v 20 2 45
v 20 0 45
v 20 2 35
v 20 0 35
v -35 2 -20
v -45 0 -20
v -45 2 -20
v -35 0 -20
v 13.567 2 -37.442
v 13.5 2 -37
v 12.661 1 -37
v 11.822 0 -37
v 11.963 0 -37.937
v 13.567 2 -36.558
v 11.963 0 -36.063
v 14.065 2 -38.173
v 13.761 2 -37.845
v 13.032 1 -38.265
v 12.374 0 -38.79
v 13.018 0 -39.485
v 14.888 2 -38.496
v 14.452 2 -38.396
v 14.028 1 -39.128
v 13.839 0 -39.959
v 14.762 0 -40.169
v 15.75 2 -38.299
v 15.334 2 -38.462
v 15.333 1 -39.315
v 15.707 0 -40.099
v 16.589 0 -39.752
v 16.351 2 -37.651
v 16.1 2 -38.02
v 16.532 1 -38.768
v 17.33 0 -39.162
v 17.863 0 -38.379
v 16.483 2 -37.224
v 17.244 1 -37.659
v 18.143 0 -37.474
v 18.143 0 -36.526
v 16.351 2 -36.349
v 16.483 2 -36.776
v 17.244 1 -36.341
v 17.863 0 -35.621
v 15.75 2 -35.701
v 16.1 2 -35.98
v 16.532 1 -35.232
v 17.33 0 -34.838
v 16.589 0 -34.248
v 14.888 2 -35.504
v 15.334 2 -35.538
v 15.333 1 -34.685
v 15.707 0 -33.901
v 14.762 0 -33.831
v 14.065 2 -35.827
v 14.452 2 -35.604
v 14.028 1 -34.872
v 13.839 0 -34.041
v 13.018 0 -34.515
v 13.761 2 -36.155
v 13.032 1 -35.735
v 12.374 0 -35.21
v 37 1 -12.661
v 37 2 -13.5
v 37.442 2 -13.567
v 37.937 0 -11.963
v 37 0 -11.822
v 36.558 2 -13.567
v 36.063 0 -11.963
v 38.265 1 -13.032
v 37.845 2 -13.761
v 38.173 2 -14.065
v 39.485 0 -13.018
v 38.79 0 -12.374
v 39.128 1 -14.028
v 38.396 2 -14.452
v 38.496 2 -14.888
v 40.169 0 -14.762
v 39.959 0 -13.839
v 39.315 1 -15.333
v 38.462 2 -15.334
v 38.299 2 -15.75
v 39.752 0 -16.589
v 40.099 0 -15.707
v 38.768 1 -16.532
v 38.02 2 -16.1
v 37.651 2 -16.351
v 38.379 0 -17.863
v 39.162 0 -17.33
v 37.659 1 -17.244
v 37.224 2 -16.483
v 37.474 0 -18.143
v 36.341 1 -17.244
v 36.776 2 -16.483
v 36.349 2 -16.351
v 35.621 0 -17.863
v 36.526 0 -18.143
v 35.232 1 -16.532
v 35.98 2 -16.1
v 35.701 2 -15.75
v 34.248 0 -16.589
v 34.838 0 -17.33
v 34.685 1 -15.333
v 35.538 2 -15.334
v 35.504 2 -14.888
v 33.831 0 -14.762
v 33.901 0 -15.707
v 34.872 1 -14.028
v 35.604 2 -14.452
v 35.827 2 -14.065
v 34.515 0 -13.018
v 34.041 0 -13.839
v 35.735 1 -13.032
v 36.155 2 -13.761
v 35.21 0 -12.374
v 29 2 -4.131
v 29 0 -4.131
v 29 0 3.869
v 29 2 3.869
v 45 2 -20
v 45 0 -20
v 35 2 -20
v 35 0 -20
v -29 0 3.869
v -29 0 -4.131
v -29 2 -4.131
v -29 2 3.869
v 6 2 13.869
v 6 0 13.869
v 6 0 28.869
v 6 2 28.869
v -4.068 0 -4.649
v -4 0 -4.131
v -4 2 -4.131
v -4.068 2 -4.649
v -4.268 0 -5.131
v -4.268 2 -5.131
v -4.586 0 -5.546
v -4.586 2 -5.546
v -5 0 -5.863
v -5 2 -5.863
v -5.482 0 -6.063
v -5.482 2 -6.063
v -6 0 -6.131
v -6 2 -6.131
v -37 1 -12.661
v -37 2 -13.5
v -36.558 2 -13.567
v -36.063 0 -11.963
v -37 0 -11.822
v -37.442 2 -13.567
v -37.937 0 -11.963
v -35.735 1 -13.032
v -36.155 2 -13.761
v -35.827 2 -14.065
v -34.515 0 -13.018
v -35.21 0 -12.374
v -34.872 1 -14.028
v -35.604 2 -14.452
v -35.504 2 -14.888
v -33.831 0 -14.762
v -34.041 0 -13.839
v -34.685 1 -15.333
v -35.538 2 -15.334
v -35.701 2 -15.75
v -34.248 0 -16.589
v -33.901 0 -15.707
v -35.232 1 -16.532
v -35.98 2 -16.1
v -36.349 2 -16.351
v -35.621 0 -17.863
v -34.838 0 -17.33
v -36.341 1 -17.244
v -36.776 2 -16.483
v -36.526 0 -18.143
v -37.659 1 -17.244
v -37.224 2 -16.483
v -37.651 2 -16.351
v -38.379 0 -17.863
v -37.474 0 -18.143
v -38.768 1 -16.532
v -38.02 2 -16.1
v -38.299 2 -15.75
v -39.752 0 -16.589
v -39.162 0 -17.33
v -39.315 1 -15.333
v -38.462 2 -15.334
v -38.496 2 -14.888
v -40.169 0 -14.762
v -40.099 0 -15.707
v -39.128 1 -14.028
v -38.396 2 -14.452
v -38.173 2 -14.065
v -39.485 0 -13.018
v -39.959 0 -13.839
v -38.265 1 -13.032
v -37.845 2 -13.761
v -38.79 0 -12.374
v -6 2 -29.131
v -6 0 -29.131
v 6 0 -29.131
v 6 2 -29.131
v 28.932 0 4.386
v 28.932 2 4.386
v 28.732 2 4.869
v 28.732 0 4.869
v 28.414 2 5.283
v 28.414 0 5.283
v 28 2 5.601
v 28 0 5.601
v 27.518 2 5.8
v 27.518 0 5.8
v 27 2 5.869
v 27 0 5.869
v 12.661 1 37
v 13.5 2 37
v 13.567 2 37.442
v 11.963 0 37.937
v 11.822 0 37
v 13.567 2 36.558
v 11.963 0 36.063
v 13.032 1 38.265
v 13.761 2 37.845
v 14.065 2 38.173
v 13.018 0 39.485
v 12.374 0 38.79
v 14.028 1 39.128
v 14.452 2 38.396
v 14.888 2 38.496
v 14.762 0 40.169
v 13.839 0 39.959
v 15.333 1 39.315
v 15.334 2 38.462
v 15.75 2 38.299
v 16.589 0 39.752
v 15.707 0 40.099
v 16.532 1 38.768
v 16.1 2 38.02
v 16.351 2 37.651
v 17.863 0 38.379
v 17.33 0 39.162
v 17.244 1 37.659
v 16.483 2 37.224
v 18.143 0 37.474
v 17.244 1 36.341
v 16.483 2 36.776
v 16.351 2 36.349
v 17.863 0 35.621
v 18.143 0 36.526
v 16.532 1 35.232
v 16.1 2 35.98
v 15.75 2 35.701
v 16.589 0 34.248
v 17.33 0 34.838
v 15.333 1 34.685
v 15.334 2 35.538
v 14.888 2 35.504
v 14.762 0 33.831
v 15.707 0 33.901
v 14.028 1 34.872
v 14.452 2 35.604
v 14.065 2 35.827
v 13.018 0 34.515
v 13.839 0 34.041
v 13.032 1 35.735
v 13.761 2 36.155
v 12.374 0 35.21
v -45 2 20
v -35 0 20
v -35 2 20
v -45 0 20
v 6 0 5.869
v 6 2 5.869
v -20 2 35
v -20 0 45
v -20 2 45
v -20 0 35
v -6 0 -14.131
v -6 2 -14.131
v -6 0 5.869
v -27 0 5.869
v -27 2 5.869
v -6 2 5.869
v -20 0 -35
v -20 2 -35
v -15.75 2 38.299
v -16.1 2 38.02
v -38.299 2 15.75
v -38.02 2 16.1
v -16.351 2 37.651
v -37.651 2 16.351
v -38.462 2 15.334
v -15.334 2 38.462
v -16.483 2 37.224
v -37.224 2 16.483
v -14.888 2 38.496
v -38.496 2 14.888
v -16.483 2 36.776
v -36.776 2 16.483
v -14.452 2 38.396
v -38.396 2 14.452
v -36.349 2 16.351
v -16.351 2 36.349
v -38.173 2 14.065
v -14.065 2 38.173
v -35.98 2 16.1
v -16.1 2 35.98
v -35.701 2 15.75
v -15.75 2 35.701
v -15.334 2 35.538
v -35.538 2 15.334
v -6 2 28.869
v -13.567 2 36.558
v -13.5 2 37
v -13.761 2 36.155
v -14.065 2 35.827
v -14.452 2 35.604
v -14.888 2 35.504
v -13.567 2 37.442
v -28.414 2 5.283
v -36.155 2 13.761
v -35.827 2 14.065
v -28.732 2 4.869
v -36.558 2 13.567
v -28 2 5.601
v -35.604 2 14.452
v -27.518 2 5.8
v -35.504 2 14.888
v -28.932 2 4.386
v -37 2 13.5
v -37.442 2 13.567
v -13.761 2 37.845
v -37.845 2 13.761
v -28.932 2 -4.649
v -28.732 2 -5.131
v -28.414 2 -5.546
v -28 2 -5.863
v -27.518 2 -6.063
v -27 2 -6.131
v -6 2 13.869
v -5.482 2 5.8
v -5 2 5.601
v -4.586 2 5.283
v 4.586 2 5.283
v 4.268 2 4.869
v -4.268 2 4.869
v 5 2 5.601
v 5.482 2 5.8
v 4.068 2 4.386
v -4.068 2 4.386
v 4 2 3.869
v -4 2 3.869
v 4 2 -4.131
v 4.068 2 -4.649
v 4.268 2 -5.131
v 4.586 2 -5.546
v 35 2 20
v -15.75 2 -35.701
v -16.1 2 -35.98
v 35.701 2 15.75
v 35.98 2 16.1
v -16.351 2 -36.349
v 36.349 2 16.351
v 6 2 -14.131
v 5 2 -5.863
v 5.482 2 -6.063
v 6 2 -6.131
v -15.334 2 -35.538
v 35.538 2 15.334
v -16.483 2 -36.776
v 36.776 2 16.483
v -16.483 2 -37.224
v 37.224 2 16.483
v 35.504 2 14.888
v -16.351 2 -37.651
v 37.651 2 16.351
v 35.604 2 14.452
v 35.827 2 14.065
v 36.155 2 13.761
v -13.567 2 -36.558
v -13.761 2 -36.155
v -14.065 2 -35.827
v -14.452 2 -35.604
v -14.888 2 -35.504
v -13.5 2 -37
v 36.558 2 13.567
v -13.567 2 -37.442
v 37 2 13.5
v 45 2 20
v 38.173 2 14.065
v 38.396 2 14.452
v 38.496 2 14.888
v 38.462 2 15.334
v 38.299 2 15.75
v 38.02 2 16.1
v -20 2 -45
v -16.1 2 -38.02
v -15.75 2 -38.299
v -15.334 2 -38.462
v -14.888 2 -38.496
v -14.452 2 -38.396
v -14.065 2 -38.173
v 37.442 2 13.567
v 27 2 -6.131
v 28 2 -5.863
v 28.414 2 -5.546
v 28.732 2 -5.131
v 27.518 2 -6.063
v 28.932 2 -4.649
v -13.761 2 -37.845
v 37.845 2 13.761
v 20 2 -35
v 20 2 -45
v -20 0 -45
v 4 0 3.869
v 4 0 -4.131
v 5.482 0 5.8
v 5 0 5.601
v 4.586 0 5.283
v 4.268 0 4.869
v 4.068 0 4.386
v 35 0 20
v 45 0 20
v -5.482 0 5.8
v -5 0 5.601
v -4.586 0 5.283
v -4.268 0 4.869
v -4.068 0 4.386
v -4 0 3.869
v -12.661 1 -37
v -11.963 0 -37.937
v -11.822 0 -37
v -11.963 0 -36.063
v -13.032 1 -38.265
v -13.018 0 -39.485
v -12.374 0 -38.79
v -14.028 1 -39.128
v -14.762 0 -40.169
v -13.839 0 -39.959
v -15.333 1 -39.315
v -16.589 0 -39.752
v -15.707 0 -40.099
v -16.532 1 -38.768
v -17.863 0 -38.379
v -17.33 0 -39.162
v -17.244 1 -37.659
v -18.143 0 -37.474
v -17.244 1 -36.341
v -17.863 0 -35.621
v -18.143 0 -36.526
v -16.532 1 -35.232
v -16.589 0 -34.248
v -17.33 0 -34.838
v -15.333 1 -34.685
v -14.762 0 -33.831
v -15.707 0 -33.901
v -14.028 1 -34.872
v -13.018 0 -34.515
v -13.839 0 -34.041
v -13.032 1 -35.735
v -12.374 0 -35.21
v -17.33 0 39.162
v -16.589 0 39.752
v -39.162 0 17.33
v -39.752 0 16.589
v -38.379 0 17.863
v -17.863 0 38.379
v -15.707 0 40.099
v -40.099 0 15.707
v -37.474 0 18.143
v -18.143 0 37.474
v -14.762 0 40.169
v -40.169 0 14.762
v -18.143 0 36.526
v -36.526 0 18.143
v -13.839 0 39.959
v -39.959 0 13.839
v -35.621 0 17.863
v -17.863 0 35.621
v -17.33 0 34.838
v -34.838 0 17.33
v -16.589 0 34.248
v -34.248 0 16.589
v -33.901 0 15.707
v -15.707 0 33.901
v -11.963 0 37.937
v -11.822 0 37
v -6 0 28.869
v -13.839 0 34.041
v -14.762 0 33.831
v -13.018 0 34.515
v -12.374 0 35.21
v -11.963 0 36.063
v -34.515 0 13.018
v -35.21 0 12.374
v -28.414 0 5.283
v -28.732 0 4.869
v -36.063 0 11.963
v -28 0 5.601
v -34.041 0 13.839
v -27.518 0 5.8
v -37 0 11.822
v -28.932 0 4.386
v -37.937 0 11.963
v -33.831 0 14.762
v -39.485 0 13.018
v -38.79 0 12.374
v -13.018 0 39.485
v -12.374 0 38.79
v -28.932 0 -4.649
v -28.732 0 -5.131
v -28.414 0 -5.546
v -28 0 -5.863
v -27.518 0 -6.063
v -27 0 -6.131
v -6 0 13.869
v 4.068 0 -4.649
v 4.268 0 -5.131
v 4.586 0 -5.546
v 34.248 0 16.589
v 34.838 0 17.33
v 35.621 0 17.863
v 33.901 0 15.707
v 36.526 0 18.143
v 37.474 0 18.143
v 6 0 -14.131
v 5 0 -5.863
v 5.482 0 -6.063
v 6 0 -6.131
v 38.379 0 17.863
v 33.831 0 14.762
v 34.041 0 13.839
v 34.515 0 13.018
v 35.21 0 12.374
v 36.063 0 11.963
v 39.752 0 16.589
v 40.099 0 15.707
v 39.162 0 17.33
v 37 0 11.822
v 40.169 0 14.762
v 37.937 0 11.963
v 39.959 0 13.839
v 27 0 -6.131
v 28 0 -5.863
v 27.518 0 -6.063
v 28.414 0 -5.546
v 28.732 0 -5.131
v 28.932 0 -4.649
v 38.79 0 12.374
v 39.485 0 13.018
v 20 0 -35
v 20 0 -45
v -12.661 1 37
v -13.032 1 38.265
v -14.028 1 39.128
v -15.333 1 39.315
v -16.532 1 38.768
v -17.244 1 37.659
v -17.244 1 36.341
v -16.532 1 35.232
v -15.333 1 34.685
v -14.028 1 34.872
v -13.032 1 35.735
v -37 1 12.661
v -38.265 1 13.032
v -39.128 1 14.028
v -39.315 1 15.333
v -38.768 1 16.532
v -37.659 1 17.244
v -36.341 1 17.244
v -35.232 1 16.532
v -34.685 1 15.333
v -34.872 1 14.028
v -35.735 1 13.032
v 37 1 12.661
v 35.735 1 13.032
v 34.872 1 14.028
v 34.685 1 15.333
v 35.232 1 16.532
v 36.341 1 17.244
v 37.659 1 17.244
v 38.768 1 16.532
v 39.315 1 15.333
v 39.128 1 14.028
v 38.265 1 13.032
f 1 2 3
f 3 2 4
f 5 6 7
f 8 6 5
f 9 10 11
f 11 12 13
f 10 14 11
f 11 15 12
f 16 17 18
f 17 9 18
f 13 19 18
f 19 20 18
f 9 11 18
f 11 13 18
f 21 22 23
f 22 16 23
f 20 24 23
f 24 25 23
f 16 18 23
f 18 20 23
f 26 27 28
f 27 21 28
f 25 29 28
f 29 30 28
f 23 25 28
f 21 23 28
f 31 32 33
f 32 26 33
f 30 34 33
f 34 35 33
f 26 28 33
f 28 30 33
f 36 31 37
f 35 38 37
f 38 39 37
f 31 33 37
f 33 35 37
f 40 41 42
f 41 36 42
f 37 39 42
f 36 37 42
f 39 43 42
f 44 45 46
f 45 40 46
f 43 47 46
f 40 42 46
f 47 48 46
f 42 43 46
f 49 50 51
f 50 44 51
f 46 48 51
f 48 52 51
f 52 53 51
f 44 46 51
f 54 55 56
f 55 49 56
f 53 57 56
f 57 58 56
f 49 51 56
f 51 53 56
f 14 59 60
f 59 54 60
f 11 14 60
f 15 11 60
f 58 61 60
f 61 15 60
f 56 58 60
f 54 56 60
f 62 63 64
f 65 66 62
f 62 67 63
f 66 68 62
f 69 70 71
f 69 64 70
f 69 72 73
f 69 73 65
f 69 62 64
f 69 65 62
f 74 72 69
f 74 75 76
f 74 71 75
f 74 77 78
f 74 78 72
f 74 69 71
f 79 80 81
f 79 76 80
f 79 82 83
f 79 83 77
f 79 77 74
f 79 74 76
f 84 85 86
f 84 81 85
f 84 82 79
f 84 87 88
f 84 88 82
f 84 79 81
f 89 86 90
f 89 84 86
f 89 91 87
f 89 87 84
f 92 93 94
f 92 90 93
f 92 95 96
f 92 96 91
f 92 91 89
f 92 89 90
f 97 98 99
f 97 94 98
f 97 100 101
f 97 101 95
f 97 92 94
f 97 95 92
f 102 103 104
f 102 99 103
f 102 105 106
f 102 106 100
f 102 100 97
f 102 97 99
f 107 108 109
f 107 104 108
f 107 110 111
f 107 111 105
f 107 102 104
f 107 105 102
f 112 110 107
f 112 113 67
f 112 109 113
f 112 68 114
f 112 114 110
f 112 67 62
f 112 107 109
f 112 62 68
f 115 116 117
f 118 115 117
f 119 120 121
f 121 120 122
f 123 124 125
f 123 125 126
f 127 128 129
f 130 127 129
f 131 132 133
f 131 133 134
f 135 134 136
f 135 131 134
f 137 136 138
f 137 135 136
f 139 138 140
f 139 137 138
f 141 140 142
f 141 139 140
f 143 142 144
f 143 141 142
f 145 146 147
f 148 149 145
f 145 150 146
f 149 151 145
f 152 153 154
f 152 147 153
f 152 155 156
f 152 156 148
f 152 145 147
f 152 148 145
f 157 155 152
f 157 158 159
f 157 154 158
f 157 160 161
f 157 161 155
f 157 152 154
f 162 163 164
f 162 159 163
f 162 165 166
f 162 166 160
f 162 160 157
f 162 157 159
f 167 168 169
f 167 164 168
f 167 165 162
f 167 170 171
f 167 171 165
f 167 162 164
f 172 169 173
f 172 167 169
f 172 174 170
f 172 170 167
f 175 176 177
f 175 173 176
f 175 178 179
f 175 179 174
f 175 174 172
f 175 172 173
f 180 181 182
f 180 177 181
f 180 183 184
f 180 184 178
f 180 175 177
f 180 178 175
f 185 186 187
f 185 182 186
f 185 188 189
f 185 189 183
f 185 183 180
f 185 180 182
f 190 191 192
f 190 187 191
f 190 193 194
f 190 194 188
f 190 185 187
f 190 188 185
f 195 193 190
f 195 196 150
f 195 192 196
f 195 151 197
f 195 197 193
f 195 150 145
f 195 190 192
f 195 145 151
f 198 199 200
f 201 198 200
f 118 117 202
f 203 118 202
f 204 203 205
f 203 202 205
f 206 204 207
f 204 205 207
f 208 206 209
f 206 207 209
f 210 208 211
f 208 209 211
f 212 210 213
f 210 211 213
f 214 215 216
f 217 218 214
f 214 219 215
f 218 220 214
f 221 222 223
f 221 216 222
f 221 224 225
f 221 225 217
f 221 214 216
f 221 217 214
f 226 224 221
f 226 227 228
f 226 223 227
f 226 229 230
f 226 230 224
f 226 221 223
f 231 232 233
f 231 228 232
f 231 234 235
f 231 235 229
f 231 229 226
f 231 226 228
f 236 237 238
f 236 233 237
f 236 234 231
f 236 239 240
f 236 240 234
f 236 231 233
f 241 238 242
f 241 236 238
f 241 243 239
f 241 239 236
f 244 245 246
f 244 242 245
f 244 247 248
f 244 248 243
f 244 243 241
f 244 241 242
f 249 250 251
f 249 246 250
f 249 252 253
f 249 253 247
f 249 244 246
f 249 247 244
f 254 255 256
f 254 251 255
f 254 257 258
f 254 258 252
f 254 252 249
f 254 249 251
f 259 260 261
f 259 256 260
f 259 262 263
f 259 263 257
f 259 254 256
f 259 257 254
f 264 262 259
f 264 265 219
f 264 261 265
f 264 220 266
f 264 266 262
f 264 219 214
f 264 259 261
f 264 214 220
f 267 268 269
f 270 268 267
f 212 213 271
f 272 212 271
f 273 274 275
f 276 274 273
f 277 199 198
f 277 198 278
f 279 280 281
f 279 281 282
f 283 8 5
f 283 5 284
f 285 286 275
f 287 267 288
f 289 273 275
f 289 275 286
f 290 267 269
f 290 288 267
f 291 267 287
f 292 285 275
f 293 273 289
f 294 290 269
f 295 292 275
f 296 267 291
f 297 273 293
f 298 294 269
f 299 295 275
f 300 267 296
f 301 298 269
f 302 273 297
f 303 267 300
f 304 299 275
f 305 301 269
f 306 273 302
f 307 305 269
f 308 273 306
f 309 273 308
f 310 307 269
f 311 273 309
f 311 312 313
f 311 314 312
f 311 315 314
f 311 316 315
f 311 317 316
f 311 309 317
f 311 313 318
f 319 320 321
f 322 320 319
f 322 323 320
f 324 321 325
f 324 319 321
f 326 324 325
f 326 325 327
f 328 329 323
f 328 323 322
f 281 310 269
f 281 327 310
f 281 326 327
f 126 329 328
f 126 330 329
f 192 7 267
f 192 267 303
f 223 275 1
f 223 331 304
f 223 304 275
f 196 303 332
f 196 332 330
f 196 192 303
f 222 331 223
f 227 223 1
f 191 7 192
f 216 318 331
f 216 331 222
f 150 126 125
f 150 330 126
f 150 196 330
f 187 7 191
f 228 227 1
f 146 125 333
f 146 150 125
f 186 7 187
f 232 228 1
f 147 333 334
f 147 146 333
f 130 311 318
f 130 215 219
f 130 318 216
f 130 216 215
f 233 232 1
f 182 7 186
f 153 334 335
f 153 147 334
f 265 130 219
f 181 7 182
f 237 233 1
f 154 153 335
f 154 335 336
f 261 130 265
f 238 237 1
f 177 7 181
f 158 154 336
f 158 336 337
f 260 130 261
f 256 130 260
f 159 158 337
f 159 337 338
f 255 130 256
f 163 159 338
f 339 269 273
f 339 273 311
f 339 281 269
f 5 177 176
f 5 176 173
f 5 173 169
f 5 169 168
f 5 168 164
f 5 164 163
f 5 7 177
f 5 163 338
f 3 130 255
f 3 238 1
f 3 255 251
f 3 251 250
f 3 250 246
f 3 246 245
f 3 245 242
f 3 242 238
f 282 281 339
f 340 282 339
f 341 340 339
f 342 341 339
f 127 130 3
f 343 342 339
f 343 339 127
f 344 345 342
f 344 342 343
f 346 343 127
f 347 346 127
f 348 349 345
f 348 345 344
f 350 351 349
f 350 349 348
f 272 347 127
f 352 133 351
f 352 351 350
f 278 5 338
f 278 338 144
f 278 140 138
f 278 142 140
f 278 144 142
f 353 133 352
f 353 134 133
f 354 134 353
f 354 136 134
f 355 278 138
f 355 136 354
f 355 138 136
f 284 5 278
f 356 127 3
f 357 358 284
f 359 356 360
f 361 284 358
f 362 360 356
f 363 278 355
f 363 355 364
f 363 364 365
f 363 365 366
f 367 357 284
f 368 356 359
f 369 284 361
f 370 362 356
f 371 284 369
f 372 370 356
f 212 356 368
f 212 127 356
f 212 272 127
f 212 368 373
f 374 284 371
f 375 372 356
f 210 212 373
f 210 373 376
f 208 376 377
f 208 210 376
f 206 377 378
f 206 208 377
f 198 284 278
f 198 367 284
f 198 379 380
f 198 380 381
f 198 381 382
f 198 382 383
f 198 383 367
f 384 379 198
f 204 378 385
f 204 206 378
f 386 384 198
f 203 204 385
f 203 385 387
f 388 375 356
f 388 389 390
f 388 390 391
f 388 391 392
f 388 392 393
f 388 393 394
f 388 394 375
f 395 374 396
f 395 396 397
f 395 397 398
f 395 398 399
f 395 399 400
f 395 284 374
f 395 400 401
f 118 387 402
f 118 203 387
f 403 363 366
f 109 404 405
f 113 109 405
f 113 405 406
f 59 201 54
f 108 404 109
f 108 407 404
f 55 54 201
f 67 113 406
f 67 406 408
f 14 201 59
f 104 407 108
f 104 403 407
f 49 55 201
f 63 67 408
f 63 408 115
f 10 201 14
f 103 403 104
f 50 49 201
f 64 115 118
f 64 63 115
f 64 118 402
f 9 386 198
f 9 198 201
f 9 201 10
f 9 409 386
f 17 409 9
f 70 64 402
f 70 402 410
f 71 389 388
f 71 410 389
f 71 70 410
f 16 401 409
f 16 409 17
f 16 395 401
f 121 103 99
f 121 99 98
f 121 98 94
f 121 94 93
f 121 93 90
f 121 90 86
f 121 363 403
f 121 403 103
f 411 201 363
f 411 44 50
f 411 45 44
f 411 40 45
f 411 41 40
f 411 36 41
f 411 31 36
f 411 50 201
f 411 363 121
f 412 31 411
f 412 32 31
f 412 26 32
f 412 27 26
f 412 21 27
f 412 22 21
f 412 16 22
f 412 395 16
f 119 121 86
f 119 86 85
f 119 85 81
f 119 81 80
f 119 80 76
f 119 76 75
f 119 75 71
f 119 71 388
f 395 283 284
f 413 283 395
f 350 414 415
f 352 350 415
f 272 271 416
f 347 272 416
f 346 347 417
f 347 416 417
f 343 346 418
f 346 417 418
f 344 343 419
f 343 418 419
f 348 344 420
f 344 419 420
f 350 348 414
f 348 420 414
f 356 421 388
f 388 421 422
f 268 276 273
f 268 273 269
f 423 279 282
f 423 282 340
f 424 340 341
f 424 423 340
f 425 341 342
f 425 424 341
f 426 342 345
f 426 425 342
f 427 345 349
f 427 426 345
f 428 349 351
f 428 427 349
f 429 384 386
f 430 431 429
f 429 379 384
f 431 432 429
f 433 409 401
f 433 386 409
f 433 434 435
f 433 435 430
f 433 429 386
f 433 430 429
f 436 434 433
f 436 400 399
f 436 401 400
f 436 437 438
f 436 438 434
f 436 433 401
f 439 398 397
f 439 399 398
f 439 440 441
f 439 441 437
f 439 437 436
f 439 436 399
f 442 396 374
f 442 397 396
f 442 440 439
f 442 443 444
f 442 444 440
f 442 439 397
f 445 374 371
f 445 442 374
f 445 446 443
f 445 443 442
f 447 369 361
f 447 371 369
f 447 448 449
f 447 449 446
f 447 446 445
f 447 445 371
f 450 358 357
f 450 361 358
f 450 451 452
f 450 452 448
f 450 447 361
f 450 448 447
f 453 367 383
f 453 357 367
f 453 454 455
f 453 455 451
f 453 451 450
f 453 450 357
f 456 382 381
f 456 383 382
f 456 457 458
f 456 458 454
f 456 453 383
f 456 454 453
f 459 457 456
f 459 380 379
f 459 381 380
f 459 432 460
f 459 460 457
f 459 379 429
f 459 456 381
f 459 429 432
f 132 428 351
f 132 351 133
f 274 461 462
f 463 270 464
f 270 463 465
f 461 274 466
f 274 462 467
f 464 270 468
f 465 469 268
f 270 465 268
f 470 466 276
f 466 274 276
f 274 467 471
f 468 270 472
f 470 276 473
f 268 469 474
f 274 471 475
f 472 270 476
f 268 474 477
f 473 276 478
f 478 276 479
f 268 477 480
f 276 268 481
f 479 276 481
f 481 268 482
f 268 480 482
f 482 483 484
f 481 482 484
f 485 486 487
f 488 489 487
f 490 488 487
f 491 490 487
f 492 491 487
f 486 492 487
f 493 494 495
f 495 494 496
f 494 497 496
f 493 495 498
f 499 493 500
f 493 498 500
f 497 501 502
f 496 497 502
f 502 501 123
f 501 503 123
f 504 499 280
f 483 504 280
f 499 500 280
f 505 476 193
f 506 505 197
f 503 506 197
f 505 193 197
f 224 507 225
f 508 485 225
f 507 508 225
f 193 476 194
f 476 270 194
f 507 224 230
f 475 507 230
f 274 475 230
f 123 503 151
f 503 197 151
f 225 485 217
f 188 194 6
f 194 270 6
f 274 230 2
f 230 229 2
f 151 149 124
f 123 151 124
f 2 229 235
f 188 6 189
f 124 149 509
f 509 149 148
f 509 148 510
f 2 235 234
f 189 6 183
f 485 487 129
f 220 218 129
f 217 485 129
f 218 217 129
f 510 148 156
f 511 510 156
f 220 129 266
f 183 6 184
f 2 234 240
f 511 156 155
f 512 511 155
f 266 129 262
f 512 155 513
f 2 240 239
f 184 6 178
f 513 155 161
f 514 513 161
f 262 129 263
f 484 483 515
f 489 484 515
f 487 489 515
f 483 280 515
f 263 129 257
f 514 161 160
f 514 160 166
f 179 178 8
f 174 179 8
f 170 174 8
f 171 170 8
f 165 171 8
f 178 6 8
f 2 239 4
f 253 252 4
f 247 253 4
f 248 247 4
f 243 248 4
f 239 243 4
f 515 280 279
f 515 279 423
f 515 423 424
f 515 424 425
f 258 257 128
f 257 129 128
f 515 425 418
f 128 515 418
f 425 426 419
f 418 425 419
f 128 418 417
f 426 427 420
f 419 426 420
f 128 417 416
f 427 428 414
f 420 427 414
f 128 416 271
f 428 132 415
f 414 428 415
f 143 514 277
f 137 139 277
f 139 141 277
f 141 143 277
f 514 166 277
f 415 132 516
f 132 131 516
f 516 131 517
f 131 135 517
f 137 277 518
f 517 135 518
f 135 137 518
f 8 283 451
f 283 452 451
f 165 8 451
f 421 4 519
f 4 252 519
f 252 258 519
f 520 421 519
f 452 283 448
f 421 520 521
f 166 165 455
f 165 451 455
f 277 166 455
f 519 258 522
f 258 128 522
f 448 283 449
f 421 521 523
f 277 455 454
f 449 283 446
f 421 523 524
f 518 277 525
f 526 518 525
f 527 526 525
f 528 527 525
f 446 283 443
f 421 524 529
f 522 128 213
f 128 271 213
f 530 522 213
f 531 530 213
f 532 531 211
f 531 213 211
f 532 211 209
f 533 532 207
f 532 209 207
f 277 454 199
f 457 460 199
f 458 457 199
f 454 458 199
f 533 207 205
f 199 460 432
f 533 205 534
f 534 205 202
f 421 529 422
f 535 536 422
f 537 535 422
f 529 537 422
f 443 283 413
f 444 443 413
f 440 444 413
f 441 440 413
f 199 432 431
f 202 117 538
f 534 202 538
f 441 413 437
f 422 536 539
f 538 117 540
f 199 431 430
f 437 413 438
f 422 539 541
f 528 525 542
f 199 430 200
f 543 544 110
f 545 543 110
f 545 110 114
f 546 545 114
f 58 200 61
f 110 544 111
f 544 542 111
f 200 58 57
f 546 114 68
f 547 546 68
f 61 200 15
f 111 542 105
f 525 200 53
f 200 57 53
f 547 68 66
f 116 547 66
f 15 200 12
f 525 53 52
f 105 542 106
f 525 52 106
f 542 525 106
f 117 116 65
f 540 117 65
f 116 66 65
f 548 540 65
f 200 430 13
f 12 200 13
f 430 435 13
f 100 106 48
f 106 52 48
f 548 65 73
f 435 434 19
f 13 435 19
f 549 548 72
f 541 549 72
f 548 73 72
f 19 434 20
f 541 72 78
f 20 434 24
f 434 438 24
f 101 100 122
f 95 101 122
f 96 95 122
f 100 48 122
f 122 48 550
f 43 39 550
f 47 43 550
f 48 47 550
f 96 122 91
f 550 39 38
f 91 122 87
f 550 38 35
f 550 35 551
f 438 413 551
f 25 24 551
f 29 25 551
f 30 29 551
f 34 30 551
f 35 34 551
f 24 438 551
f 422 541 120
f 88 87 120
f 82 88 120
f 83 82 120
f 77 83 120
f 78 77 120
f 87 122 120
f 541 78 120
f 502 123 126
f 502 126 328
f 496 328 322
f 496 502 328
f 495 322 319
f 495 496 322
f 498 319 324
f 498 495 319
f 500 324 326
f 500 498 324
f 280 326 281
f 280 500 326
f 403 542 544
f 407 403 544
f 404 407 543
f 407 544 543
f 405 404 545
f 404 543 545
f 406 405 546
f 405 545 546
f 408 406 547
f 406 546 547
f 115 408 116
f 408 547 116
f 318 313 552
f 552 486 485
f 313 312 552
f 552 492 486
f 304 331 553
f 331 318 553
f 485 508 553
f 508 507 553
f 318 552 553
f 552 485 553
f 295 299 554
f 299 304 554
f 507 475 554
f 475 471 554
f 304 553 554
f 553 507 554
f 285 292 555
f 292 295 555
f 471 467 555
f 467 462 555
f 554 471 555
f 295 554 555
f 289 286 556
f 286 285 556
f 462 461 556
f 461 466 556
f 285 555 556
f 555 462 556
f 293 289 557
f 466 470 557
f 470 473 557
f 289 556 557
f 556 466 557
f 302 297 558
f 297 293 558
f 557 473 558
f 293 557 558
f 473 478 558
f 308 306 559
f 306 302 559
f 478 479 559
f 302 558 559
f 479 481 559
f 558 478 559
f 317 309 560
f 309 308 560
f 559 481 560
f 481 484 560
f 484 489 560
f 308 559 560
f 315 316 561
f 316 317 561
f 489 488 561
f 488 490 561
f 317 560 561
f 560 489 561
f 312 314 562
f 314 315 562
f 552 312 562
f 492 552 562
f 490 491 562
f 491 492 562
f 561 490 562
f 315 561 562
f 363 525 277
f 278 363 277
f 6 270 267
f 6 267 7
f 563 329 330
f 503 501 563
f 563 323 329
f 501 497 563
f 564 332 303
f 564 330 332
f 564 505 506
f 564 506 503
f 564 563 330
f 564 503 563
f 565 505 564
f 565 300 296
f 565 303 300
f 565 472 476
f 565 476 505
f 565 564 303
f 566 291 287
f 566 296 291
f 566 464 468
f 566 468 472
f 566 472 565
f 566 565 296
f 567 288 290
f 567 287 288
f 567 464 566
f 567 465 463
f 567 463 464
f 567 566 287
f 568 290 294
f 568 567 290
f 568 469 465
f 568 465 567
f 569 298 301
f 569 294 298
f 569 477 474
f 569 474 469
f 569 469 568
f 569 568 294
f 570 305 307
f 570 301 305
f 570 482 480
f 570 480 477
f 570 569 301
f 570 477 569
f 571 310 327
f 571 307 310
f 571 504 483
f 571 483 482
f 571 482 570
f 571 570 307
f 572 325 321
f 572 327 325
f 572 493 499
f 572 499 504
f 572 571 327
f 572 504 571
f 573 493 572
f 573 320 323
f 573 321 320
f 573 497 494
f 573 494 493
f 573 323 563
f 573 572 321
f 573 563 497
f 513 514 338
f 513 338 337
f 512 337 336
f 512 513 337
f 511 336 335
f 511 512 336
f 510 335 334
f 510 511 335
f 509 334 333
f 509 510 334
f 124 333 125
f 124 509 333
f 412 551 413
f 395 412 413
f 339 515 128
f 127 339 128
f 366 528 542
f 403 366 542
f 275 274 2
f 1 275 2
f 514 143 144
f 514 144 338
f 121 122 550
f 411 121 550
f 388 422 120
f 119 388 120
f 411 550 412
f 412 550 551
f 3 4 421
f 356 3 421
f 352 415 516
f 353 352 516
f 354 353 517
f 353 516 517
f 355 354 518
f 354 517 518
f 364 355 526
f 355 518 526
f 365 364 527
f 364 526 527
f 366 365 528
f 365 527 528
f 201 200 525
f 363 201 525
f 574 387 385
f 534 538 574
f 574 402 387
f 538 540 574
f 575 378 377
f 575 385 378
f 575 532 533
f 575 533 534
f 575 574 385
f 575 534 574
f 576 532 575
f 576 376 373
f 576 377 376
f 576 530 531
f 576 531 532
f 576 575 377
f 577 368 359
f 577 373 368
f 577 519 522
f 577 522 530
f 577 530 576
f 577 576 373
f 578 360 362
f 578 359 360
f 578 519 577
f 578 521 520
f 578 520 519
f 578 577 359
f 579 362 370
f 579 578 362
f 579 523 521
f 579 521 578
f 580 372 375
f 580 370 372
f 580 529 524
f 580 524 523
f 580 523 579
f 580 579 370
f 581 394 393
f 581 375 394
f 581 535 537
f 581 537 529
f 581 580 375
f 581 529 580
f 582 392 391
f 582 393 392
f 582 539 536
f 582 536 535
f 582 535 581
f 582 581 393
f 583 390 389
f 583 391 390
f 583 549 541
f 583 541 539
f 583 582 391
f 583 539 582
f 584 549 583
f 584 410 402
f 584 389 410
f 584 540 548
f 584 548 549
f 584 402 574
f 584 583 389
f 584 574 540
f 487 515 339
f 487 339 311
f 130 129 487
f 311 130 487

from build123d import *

# Parameters (mm, degrees)
RESSALTO_EXTRUS_O1_DEPTH        = 2
ESBO_O2_R                       = 1.5
CORTE_EXTRUS_O1_DEPTH           = 3
CORTE_EXTRUS_O1_TAPER           = -40
ESPELHAR3_COPY_1_SKETCH_R       = 1.5
ESPELHAR3_COPY_1_DEPTH          = 3
ESPELHAR3_COPY_1_TAPER          = -40
PADR_OCIRCULAR1_COUNT           = 2
PADR_OCIRCULAR1_ANGLE           = 90
PADR_OCIRCULAR1_COPY_1_SKETCH_R = 1.5
PADR_OCIRCULAR1_COPY_1_DEPTH    = 3
PADR_OCIRCULAR1_COPY_1_TAPER    = -40
PADR_OCIRCULAR1_COPY_2_SKETCH_R = 1.5
PADR_OCIRCULAR1_COPY_2_DEPTH    = 3
PADR_OCIRCULAR1_COPY_2_TAPER    = -40
PADR_OCIRCULAR1_COPY_3_SKETCH_R = 1.5
PADR_OCIRCULAR1_COPY_3_DEPTH    = 3
PADR_OCIRCULAR1_COPY_3_TAPER    = -40


with BuildPart() as part:
    # Esboço1 → Ressalto-extrusão1 (new body)
    with BuildSketch(Plane(origin=(0, 0, 0), x_dir=(1, 0, 0), z_dir=(0, 1, 0))):
        Polygon((-20, 35), (-20, 45), (0, 45), (0, 29.131440421), (-6, 29.131440421), (-6, 14.131440421), (0, 14.131440421), (0, -13.868559579), (-6, -13.868559579), (-6, -28.868559579), (0, -28.868559579), (0, -45), (-20, -45), (-20, -35), (-35, -20), (-45, -20), (-45, 20), (-35, 20), align=None)
        with BuildLine():
            Line((-27, -5.868559579), (-6, -5.868559579))
            ThreePointArc((-6, -5.868559579), (-4.585786438, -5.282773141), (-4, -3.868559579))
            Line((-4, -3.868559579), (-4, 4.131440421))
            ThreePointArc((-4, 4.131440421), (-4.585786438, 5.545653984), (-6, 6.131440421))
            Line((-6, 6.131440421), (-27, 6.131440421))
            ThreePointArc((-27, 6.131440421), (-28.414213562, 5.545653984), (-29, 4.131440421))
            Line((-29, 4.131440421), (-29, -3.868559579))
            ThreePointArc((-29, -3.868559579), (-28.414213562, -5.282773141), (-27, -5.868559579))
        make_face(mode=Mode.SUBTRACT)
    ressalto_extrus_o1 = extrude(amount=RESSALTO_EXTRUS_O1_DEPTH)

    # Espelhar1: Ressalto-extrusão1 across plane
    add(ressalto_extrus_o1.mirror(Plane(origin=(0, 0, 0), x_dir=(0, 0, 1), z_dir=(1, 0, 0))))

    # Esboço2 → Corte-extrusão1 (cut, through all)
    with BuildSketch(Plane(origin=(0, 2, 0), x_dir=(1, 0, 0), z_dir=(0, 1, 0))):
        with Locations((-15, 37)):
            Circle(ESBO_O2_R)
    corte_extrus_o1 = extrude(amount=-CORTE_EXTRUS_O1_DEPTH, taper=CORTE_EXTRUS_O1_TAPER, mode=Mode.SUBTRACT)

    # Espelhar2: Corte-extrusão1 across plane
    add(corte_extrus_o1.mirror(Plane(origin=(0, 0, 0), x_dir=(0, 0, 1), z_dir=(1, 0, 0))), mode=Mode.SUBTRACT)

    # Espelhar3: Corte-extrusão1 across plane
    add(corte_extrus_o1.mirror(Plane.XY), mode=Mode.SUBTRACT)

    # Espelhar3 copy 1 sketch → Espelhar3 copy 1 (cut, through all)
    with BuildSketch(Plane(origin=(0, 2, 0), x_dir=(-1, 0, 0), z_dir=(0, 1, 0))):
        with Locations((-15, 37)):
            Circle(ESPELHAR3_COPY_1_SKETCH_R)
    extrude(amount=-ESPELHAR3_COPY_1_DEPTH, taper=ESPELHAR3_COPY_1_TAPER, mode=Mode.SUBTRACT)

    # PadrãoCircular1: Corte-extrusão1 ×2 about axis
    padr_ocircular1_axis = Axis((0, 0, 0), (0, -1, 0))
    for i in range(1, PADR_OCIRCULAR1_COUNT):
        add(corte_extrus_o1.rotate(padr_ocircular1_axis, i * PADR_OCIRCULAR1_ANGLE / (PADR_OCIRCULAR1_COUNT - 1)), mode=Mode.SUBTRACT)

    # PadrãoCircular1 copy 1 sketch → PadrãoCircular1 copy 1 (cut, through all)
    with BuildSketch(Plane.ZX.offset(2)):
        with Locations((-15, -37)):
            Circle(PADR_OCIRCULAR1_COPY_1_SKETCH_R)
    extrude(amount=-PADR_OCIRCULAR1_COPY_1_DEPTH, taper=PADR_OCIRCULAR1_COPY_1_TAPER, mode=Mode.SUBTRACT)

    # PadrãoCircular1 copy 2 sketch → PadrãoCircular1 copy 2 (cut, through all)
    with BuildSketch(Plane(origin=(0, 2, 0), x_dir=(0, 0, -1), z_dir=(0, 1, 0))):
        with Locations((-15, 37)):
            Circle(PADR_OCIRCULAR1_COPY_2_SKETCH_R)
    extrude(amount=-PADR_OCIRCULAR1_COPY_2_DEPTH, taper=PADR_OCIRCULAR1_COPY_2_TAPER, mode=Mode.SUBTRACT)

    # PadrãoCircular1 copy 3 sketch → PadrãoCircular1 copy 3 (cut, through all)
    with BuildSketch(Plane(origin=(0, 2, 0), x_dir=(0, 0, -1), z_dir=(0, 1, 0))):
        with Locations((-15, -37)):
            Circle(PADR_OCIRCULAR1_COPY_3_SKETCH_R)
    extrude(amount=-PADR_OCIRCULAR1_COPY_3_DEPTH, taper=PADR_OCIRCULAR1_COPY_3_TAPER, mode=Mode.SUBTRACT)


solid = part.part
